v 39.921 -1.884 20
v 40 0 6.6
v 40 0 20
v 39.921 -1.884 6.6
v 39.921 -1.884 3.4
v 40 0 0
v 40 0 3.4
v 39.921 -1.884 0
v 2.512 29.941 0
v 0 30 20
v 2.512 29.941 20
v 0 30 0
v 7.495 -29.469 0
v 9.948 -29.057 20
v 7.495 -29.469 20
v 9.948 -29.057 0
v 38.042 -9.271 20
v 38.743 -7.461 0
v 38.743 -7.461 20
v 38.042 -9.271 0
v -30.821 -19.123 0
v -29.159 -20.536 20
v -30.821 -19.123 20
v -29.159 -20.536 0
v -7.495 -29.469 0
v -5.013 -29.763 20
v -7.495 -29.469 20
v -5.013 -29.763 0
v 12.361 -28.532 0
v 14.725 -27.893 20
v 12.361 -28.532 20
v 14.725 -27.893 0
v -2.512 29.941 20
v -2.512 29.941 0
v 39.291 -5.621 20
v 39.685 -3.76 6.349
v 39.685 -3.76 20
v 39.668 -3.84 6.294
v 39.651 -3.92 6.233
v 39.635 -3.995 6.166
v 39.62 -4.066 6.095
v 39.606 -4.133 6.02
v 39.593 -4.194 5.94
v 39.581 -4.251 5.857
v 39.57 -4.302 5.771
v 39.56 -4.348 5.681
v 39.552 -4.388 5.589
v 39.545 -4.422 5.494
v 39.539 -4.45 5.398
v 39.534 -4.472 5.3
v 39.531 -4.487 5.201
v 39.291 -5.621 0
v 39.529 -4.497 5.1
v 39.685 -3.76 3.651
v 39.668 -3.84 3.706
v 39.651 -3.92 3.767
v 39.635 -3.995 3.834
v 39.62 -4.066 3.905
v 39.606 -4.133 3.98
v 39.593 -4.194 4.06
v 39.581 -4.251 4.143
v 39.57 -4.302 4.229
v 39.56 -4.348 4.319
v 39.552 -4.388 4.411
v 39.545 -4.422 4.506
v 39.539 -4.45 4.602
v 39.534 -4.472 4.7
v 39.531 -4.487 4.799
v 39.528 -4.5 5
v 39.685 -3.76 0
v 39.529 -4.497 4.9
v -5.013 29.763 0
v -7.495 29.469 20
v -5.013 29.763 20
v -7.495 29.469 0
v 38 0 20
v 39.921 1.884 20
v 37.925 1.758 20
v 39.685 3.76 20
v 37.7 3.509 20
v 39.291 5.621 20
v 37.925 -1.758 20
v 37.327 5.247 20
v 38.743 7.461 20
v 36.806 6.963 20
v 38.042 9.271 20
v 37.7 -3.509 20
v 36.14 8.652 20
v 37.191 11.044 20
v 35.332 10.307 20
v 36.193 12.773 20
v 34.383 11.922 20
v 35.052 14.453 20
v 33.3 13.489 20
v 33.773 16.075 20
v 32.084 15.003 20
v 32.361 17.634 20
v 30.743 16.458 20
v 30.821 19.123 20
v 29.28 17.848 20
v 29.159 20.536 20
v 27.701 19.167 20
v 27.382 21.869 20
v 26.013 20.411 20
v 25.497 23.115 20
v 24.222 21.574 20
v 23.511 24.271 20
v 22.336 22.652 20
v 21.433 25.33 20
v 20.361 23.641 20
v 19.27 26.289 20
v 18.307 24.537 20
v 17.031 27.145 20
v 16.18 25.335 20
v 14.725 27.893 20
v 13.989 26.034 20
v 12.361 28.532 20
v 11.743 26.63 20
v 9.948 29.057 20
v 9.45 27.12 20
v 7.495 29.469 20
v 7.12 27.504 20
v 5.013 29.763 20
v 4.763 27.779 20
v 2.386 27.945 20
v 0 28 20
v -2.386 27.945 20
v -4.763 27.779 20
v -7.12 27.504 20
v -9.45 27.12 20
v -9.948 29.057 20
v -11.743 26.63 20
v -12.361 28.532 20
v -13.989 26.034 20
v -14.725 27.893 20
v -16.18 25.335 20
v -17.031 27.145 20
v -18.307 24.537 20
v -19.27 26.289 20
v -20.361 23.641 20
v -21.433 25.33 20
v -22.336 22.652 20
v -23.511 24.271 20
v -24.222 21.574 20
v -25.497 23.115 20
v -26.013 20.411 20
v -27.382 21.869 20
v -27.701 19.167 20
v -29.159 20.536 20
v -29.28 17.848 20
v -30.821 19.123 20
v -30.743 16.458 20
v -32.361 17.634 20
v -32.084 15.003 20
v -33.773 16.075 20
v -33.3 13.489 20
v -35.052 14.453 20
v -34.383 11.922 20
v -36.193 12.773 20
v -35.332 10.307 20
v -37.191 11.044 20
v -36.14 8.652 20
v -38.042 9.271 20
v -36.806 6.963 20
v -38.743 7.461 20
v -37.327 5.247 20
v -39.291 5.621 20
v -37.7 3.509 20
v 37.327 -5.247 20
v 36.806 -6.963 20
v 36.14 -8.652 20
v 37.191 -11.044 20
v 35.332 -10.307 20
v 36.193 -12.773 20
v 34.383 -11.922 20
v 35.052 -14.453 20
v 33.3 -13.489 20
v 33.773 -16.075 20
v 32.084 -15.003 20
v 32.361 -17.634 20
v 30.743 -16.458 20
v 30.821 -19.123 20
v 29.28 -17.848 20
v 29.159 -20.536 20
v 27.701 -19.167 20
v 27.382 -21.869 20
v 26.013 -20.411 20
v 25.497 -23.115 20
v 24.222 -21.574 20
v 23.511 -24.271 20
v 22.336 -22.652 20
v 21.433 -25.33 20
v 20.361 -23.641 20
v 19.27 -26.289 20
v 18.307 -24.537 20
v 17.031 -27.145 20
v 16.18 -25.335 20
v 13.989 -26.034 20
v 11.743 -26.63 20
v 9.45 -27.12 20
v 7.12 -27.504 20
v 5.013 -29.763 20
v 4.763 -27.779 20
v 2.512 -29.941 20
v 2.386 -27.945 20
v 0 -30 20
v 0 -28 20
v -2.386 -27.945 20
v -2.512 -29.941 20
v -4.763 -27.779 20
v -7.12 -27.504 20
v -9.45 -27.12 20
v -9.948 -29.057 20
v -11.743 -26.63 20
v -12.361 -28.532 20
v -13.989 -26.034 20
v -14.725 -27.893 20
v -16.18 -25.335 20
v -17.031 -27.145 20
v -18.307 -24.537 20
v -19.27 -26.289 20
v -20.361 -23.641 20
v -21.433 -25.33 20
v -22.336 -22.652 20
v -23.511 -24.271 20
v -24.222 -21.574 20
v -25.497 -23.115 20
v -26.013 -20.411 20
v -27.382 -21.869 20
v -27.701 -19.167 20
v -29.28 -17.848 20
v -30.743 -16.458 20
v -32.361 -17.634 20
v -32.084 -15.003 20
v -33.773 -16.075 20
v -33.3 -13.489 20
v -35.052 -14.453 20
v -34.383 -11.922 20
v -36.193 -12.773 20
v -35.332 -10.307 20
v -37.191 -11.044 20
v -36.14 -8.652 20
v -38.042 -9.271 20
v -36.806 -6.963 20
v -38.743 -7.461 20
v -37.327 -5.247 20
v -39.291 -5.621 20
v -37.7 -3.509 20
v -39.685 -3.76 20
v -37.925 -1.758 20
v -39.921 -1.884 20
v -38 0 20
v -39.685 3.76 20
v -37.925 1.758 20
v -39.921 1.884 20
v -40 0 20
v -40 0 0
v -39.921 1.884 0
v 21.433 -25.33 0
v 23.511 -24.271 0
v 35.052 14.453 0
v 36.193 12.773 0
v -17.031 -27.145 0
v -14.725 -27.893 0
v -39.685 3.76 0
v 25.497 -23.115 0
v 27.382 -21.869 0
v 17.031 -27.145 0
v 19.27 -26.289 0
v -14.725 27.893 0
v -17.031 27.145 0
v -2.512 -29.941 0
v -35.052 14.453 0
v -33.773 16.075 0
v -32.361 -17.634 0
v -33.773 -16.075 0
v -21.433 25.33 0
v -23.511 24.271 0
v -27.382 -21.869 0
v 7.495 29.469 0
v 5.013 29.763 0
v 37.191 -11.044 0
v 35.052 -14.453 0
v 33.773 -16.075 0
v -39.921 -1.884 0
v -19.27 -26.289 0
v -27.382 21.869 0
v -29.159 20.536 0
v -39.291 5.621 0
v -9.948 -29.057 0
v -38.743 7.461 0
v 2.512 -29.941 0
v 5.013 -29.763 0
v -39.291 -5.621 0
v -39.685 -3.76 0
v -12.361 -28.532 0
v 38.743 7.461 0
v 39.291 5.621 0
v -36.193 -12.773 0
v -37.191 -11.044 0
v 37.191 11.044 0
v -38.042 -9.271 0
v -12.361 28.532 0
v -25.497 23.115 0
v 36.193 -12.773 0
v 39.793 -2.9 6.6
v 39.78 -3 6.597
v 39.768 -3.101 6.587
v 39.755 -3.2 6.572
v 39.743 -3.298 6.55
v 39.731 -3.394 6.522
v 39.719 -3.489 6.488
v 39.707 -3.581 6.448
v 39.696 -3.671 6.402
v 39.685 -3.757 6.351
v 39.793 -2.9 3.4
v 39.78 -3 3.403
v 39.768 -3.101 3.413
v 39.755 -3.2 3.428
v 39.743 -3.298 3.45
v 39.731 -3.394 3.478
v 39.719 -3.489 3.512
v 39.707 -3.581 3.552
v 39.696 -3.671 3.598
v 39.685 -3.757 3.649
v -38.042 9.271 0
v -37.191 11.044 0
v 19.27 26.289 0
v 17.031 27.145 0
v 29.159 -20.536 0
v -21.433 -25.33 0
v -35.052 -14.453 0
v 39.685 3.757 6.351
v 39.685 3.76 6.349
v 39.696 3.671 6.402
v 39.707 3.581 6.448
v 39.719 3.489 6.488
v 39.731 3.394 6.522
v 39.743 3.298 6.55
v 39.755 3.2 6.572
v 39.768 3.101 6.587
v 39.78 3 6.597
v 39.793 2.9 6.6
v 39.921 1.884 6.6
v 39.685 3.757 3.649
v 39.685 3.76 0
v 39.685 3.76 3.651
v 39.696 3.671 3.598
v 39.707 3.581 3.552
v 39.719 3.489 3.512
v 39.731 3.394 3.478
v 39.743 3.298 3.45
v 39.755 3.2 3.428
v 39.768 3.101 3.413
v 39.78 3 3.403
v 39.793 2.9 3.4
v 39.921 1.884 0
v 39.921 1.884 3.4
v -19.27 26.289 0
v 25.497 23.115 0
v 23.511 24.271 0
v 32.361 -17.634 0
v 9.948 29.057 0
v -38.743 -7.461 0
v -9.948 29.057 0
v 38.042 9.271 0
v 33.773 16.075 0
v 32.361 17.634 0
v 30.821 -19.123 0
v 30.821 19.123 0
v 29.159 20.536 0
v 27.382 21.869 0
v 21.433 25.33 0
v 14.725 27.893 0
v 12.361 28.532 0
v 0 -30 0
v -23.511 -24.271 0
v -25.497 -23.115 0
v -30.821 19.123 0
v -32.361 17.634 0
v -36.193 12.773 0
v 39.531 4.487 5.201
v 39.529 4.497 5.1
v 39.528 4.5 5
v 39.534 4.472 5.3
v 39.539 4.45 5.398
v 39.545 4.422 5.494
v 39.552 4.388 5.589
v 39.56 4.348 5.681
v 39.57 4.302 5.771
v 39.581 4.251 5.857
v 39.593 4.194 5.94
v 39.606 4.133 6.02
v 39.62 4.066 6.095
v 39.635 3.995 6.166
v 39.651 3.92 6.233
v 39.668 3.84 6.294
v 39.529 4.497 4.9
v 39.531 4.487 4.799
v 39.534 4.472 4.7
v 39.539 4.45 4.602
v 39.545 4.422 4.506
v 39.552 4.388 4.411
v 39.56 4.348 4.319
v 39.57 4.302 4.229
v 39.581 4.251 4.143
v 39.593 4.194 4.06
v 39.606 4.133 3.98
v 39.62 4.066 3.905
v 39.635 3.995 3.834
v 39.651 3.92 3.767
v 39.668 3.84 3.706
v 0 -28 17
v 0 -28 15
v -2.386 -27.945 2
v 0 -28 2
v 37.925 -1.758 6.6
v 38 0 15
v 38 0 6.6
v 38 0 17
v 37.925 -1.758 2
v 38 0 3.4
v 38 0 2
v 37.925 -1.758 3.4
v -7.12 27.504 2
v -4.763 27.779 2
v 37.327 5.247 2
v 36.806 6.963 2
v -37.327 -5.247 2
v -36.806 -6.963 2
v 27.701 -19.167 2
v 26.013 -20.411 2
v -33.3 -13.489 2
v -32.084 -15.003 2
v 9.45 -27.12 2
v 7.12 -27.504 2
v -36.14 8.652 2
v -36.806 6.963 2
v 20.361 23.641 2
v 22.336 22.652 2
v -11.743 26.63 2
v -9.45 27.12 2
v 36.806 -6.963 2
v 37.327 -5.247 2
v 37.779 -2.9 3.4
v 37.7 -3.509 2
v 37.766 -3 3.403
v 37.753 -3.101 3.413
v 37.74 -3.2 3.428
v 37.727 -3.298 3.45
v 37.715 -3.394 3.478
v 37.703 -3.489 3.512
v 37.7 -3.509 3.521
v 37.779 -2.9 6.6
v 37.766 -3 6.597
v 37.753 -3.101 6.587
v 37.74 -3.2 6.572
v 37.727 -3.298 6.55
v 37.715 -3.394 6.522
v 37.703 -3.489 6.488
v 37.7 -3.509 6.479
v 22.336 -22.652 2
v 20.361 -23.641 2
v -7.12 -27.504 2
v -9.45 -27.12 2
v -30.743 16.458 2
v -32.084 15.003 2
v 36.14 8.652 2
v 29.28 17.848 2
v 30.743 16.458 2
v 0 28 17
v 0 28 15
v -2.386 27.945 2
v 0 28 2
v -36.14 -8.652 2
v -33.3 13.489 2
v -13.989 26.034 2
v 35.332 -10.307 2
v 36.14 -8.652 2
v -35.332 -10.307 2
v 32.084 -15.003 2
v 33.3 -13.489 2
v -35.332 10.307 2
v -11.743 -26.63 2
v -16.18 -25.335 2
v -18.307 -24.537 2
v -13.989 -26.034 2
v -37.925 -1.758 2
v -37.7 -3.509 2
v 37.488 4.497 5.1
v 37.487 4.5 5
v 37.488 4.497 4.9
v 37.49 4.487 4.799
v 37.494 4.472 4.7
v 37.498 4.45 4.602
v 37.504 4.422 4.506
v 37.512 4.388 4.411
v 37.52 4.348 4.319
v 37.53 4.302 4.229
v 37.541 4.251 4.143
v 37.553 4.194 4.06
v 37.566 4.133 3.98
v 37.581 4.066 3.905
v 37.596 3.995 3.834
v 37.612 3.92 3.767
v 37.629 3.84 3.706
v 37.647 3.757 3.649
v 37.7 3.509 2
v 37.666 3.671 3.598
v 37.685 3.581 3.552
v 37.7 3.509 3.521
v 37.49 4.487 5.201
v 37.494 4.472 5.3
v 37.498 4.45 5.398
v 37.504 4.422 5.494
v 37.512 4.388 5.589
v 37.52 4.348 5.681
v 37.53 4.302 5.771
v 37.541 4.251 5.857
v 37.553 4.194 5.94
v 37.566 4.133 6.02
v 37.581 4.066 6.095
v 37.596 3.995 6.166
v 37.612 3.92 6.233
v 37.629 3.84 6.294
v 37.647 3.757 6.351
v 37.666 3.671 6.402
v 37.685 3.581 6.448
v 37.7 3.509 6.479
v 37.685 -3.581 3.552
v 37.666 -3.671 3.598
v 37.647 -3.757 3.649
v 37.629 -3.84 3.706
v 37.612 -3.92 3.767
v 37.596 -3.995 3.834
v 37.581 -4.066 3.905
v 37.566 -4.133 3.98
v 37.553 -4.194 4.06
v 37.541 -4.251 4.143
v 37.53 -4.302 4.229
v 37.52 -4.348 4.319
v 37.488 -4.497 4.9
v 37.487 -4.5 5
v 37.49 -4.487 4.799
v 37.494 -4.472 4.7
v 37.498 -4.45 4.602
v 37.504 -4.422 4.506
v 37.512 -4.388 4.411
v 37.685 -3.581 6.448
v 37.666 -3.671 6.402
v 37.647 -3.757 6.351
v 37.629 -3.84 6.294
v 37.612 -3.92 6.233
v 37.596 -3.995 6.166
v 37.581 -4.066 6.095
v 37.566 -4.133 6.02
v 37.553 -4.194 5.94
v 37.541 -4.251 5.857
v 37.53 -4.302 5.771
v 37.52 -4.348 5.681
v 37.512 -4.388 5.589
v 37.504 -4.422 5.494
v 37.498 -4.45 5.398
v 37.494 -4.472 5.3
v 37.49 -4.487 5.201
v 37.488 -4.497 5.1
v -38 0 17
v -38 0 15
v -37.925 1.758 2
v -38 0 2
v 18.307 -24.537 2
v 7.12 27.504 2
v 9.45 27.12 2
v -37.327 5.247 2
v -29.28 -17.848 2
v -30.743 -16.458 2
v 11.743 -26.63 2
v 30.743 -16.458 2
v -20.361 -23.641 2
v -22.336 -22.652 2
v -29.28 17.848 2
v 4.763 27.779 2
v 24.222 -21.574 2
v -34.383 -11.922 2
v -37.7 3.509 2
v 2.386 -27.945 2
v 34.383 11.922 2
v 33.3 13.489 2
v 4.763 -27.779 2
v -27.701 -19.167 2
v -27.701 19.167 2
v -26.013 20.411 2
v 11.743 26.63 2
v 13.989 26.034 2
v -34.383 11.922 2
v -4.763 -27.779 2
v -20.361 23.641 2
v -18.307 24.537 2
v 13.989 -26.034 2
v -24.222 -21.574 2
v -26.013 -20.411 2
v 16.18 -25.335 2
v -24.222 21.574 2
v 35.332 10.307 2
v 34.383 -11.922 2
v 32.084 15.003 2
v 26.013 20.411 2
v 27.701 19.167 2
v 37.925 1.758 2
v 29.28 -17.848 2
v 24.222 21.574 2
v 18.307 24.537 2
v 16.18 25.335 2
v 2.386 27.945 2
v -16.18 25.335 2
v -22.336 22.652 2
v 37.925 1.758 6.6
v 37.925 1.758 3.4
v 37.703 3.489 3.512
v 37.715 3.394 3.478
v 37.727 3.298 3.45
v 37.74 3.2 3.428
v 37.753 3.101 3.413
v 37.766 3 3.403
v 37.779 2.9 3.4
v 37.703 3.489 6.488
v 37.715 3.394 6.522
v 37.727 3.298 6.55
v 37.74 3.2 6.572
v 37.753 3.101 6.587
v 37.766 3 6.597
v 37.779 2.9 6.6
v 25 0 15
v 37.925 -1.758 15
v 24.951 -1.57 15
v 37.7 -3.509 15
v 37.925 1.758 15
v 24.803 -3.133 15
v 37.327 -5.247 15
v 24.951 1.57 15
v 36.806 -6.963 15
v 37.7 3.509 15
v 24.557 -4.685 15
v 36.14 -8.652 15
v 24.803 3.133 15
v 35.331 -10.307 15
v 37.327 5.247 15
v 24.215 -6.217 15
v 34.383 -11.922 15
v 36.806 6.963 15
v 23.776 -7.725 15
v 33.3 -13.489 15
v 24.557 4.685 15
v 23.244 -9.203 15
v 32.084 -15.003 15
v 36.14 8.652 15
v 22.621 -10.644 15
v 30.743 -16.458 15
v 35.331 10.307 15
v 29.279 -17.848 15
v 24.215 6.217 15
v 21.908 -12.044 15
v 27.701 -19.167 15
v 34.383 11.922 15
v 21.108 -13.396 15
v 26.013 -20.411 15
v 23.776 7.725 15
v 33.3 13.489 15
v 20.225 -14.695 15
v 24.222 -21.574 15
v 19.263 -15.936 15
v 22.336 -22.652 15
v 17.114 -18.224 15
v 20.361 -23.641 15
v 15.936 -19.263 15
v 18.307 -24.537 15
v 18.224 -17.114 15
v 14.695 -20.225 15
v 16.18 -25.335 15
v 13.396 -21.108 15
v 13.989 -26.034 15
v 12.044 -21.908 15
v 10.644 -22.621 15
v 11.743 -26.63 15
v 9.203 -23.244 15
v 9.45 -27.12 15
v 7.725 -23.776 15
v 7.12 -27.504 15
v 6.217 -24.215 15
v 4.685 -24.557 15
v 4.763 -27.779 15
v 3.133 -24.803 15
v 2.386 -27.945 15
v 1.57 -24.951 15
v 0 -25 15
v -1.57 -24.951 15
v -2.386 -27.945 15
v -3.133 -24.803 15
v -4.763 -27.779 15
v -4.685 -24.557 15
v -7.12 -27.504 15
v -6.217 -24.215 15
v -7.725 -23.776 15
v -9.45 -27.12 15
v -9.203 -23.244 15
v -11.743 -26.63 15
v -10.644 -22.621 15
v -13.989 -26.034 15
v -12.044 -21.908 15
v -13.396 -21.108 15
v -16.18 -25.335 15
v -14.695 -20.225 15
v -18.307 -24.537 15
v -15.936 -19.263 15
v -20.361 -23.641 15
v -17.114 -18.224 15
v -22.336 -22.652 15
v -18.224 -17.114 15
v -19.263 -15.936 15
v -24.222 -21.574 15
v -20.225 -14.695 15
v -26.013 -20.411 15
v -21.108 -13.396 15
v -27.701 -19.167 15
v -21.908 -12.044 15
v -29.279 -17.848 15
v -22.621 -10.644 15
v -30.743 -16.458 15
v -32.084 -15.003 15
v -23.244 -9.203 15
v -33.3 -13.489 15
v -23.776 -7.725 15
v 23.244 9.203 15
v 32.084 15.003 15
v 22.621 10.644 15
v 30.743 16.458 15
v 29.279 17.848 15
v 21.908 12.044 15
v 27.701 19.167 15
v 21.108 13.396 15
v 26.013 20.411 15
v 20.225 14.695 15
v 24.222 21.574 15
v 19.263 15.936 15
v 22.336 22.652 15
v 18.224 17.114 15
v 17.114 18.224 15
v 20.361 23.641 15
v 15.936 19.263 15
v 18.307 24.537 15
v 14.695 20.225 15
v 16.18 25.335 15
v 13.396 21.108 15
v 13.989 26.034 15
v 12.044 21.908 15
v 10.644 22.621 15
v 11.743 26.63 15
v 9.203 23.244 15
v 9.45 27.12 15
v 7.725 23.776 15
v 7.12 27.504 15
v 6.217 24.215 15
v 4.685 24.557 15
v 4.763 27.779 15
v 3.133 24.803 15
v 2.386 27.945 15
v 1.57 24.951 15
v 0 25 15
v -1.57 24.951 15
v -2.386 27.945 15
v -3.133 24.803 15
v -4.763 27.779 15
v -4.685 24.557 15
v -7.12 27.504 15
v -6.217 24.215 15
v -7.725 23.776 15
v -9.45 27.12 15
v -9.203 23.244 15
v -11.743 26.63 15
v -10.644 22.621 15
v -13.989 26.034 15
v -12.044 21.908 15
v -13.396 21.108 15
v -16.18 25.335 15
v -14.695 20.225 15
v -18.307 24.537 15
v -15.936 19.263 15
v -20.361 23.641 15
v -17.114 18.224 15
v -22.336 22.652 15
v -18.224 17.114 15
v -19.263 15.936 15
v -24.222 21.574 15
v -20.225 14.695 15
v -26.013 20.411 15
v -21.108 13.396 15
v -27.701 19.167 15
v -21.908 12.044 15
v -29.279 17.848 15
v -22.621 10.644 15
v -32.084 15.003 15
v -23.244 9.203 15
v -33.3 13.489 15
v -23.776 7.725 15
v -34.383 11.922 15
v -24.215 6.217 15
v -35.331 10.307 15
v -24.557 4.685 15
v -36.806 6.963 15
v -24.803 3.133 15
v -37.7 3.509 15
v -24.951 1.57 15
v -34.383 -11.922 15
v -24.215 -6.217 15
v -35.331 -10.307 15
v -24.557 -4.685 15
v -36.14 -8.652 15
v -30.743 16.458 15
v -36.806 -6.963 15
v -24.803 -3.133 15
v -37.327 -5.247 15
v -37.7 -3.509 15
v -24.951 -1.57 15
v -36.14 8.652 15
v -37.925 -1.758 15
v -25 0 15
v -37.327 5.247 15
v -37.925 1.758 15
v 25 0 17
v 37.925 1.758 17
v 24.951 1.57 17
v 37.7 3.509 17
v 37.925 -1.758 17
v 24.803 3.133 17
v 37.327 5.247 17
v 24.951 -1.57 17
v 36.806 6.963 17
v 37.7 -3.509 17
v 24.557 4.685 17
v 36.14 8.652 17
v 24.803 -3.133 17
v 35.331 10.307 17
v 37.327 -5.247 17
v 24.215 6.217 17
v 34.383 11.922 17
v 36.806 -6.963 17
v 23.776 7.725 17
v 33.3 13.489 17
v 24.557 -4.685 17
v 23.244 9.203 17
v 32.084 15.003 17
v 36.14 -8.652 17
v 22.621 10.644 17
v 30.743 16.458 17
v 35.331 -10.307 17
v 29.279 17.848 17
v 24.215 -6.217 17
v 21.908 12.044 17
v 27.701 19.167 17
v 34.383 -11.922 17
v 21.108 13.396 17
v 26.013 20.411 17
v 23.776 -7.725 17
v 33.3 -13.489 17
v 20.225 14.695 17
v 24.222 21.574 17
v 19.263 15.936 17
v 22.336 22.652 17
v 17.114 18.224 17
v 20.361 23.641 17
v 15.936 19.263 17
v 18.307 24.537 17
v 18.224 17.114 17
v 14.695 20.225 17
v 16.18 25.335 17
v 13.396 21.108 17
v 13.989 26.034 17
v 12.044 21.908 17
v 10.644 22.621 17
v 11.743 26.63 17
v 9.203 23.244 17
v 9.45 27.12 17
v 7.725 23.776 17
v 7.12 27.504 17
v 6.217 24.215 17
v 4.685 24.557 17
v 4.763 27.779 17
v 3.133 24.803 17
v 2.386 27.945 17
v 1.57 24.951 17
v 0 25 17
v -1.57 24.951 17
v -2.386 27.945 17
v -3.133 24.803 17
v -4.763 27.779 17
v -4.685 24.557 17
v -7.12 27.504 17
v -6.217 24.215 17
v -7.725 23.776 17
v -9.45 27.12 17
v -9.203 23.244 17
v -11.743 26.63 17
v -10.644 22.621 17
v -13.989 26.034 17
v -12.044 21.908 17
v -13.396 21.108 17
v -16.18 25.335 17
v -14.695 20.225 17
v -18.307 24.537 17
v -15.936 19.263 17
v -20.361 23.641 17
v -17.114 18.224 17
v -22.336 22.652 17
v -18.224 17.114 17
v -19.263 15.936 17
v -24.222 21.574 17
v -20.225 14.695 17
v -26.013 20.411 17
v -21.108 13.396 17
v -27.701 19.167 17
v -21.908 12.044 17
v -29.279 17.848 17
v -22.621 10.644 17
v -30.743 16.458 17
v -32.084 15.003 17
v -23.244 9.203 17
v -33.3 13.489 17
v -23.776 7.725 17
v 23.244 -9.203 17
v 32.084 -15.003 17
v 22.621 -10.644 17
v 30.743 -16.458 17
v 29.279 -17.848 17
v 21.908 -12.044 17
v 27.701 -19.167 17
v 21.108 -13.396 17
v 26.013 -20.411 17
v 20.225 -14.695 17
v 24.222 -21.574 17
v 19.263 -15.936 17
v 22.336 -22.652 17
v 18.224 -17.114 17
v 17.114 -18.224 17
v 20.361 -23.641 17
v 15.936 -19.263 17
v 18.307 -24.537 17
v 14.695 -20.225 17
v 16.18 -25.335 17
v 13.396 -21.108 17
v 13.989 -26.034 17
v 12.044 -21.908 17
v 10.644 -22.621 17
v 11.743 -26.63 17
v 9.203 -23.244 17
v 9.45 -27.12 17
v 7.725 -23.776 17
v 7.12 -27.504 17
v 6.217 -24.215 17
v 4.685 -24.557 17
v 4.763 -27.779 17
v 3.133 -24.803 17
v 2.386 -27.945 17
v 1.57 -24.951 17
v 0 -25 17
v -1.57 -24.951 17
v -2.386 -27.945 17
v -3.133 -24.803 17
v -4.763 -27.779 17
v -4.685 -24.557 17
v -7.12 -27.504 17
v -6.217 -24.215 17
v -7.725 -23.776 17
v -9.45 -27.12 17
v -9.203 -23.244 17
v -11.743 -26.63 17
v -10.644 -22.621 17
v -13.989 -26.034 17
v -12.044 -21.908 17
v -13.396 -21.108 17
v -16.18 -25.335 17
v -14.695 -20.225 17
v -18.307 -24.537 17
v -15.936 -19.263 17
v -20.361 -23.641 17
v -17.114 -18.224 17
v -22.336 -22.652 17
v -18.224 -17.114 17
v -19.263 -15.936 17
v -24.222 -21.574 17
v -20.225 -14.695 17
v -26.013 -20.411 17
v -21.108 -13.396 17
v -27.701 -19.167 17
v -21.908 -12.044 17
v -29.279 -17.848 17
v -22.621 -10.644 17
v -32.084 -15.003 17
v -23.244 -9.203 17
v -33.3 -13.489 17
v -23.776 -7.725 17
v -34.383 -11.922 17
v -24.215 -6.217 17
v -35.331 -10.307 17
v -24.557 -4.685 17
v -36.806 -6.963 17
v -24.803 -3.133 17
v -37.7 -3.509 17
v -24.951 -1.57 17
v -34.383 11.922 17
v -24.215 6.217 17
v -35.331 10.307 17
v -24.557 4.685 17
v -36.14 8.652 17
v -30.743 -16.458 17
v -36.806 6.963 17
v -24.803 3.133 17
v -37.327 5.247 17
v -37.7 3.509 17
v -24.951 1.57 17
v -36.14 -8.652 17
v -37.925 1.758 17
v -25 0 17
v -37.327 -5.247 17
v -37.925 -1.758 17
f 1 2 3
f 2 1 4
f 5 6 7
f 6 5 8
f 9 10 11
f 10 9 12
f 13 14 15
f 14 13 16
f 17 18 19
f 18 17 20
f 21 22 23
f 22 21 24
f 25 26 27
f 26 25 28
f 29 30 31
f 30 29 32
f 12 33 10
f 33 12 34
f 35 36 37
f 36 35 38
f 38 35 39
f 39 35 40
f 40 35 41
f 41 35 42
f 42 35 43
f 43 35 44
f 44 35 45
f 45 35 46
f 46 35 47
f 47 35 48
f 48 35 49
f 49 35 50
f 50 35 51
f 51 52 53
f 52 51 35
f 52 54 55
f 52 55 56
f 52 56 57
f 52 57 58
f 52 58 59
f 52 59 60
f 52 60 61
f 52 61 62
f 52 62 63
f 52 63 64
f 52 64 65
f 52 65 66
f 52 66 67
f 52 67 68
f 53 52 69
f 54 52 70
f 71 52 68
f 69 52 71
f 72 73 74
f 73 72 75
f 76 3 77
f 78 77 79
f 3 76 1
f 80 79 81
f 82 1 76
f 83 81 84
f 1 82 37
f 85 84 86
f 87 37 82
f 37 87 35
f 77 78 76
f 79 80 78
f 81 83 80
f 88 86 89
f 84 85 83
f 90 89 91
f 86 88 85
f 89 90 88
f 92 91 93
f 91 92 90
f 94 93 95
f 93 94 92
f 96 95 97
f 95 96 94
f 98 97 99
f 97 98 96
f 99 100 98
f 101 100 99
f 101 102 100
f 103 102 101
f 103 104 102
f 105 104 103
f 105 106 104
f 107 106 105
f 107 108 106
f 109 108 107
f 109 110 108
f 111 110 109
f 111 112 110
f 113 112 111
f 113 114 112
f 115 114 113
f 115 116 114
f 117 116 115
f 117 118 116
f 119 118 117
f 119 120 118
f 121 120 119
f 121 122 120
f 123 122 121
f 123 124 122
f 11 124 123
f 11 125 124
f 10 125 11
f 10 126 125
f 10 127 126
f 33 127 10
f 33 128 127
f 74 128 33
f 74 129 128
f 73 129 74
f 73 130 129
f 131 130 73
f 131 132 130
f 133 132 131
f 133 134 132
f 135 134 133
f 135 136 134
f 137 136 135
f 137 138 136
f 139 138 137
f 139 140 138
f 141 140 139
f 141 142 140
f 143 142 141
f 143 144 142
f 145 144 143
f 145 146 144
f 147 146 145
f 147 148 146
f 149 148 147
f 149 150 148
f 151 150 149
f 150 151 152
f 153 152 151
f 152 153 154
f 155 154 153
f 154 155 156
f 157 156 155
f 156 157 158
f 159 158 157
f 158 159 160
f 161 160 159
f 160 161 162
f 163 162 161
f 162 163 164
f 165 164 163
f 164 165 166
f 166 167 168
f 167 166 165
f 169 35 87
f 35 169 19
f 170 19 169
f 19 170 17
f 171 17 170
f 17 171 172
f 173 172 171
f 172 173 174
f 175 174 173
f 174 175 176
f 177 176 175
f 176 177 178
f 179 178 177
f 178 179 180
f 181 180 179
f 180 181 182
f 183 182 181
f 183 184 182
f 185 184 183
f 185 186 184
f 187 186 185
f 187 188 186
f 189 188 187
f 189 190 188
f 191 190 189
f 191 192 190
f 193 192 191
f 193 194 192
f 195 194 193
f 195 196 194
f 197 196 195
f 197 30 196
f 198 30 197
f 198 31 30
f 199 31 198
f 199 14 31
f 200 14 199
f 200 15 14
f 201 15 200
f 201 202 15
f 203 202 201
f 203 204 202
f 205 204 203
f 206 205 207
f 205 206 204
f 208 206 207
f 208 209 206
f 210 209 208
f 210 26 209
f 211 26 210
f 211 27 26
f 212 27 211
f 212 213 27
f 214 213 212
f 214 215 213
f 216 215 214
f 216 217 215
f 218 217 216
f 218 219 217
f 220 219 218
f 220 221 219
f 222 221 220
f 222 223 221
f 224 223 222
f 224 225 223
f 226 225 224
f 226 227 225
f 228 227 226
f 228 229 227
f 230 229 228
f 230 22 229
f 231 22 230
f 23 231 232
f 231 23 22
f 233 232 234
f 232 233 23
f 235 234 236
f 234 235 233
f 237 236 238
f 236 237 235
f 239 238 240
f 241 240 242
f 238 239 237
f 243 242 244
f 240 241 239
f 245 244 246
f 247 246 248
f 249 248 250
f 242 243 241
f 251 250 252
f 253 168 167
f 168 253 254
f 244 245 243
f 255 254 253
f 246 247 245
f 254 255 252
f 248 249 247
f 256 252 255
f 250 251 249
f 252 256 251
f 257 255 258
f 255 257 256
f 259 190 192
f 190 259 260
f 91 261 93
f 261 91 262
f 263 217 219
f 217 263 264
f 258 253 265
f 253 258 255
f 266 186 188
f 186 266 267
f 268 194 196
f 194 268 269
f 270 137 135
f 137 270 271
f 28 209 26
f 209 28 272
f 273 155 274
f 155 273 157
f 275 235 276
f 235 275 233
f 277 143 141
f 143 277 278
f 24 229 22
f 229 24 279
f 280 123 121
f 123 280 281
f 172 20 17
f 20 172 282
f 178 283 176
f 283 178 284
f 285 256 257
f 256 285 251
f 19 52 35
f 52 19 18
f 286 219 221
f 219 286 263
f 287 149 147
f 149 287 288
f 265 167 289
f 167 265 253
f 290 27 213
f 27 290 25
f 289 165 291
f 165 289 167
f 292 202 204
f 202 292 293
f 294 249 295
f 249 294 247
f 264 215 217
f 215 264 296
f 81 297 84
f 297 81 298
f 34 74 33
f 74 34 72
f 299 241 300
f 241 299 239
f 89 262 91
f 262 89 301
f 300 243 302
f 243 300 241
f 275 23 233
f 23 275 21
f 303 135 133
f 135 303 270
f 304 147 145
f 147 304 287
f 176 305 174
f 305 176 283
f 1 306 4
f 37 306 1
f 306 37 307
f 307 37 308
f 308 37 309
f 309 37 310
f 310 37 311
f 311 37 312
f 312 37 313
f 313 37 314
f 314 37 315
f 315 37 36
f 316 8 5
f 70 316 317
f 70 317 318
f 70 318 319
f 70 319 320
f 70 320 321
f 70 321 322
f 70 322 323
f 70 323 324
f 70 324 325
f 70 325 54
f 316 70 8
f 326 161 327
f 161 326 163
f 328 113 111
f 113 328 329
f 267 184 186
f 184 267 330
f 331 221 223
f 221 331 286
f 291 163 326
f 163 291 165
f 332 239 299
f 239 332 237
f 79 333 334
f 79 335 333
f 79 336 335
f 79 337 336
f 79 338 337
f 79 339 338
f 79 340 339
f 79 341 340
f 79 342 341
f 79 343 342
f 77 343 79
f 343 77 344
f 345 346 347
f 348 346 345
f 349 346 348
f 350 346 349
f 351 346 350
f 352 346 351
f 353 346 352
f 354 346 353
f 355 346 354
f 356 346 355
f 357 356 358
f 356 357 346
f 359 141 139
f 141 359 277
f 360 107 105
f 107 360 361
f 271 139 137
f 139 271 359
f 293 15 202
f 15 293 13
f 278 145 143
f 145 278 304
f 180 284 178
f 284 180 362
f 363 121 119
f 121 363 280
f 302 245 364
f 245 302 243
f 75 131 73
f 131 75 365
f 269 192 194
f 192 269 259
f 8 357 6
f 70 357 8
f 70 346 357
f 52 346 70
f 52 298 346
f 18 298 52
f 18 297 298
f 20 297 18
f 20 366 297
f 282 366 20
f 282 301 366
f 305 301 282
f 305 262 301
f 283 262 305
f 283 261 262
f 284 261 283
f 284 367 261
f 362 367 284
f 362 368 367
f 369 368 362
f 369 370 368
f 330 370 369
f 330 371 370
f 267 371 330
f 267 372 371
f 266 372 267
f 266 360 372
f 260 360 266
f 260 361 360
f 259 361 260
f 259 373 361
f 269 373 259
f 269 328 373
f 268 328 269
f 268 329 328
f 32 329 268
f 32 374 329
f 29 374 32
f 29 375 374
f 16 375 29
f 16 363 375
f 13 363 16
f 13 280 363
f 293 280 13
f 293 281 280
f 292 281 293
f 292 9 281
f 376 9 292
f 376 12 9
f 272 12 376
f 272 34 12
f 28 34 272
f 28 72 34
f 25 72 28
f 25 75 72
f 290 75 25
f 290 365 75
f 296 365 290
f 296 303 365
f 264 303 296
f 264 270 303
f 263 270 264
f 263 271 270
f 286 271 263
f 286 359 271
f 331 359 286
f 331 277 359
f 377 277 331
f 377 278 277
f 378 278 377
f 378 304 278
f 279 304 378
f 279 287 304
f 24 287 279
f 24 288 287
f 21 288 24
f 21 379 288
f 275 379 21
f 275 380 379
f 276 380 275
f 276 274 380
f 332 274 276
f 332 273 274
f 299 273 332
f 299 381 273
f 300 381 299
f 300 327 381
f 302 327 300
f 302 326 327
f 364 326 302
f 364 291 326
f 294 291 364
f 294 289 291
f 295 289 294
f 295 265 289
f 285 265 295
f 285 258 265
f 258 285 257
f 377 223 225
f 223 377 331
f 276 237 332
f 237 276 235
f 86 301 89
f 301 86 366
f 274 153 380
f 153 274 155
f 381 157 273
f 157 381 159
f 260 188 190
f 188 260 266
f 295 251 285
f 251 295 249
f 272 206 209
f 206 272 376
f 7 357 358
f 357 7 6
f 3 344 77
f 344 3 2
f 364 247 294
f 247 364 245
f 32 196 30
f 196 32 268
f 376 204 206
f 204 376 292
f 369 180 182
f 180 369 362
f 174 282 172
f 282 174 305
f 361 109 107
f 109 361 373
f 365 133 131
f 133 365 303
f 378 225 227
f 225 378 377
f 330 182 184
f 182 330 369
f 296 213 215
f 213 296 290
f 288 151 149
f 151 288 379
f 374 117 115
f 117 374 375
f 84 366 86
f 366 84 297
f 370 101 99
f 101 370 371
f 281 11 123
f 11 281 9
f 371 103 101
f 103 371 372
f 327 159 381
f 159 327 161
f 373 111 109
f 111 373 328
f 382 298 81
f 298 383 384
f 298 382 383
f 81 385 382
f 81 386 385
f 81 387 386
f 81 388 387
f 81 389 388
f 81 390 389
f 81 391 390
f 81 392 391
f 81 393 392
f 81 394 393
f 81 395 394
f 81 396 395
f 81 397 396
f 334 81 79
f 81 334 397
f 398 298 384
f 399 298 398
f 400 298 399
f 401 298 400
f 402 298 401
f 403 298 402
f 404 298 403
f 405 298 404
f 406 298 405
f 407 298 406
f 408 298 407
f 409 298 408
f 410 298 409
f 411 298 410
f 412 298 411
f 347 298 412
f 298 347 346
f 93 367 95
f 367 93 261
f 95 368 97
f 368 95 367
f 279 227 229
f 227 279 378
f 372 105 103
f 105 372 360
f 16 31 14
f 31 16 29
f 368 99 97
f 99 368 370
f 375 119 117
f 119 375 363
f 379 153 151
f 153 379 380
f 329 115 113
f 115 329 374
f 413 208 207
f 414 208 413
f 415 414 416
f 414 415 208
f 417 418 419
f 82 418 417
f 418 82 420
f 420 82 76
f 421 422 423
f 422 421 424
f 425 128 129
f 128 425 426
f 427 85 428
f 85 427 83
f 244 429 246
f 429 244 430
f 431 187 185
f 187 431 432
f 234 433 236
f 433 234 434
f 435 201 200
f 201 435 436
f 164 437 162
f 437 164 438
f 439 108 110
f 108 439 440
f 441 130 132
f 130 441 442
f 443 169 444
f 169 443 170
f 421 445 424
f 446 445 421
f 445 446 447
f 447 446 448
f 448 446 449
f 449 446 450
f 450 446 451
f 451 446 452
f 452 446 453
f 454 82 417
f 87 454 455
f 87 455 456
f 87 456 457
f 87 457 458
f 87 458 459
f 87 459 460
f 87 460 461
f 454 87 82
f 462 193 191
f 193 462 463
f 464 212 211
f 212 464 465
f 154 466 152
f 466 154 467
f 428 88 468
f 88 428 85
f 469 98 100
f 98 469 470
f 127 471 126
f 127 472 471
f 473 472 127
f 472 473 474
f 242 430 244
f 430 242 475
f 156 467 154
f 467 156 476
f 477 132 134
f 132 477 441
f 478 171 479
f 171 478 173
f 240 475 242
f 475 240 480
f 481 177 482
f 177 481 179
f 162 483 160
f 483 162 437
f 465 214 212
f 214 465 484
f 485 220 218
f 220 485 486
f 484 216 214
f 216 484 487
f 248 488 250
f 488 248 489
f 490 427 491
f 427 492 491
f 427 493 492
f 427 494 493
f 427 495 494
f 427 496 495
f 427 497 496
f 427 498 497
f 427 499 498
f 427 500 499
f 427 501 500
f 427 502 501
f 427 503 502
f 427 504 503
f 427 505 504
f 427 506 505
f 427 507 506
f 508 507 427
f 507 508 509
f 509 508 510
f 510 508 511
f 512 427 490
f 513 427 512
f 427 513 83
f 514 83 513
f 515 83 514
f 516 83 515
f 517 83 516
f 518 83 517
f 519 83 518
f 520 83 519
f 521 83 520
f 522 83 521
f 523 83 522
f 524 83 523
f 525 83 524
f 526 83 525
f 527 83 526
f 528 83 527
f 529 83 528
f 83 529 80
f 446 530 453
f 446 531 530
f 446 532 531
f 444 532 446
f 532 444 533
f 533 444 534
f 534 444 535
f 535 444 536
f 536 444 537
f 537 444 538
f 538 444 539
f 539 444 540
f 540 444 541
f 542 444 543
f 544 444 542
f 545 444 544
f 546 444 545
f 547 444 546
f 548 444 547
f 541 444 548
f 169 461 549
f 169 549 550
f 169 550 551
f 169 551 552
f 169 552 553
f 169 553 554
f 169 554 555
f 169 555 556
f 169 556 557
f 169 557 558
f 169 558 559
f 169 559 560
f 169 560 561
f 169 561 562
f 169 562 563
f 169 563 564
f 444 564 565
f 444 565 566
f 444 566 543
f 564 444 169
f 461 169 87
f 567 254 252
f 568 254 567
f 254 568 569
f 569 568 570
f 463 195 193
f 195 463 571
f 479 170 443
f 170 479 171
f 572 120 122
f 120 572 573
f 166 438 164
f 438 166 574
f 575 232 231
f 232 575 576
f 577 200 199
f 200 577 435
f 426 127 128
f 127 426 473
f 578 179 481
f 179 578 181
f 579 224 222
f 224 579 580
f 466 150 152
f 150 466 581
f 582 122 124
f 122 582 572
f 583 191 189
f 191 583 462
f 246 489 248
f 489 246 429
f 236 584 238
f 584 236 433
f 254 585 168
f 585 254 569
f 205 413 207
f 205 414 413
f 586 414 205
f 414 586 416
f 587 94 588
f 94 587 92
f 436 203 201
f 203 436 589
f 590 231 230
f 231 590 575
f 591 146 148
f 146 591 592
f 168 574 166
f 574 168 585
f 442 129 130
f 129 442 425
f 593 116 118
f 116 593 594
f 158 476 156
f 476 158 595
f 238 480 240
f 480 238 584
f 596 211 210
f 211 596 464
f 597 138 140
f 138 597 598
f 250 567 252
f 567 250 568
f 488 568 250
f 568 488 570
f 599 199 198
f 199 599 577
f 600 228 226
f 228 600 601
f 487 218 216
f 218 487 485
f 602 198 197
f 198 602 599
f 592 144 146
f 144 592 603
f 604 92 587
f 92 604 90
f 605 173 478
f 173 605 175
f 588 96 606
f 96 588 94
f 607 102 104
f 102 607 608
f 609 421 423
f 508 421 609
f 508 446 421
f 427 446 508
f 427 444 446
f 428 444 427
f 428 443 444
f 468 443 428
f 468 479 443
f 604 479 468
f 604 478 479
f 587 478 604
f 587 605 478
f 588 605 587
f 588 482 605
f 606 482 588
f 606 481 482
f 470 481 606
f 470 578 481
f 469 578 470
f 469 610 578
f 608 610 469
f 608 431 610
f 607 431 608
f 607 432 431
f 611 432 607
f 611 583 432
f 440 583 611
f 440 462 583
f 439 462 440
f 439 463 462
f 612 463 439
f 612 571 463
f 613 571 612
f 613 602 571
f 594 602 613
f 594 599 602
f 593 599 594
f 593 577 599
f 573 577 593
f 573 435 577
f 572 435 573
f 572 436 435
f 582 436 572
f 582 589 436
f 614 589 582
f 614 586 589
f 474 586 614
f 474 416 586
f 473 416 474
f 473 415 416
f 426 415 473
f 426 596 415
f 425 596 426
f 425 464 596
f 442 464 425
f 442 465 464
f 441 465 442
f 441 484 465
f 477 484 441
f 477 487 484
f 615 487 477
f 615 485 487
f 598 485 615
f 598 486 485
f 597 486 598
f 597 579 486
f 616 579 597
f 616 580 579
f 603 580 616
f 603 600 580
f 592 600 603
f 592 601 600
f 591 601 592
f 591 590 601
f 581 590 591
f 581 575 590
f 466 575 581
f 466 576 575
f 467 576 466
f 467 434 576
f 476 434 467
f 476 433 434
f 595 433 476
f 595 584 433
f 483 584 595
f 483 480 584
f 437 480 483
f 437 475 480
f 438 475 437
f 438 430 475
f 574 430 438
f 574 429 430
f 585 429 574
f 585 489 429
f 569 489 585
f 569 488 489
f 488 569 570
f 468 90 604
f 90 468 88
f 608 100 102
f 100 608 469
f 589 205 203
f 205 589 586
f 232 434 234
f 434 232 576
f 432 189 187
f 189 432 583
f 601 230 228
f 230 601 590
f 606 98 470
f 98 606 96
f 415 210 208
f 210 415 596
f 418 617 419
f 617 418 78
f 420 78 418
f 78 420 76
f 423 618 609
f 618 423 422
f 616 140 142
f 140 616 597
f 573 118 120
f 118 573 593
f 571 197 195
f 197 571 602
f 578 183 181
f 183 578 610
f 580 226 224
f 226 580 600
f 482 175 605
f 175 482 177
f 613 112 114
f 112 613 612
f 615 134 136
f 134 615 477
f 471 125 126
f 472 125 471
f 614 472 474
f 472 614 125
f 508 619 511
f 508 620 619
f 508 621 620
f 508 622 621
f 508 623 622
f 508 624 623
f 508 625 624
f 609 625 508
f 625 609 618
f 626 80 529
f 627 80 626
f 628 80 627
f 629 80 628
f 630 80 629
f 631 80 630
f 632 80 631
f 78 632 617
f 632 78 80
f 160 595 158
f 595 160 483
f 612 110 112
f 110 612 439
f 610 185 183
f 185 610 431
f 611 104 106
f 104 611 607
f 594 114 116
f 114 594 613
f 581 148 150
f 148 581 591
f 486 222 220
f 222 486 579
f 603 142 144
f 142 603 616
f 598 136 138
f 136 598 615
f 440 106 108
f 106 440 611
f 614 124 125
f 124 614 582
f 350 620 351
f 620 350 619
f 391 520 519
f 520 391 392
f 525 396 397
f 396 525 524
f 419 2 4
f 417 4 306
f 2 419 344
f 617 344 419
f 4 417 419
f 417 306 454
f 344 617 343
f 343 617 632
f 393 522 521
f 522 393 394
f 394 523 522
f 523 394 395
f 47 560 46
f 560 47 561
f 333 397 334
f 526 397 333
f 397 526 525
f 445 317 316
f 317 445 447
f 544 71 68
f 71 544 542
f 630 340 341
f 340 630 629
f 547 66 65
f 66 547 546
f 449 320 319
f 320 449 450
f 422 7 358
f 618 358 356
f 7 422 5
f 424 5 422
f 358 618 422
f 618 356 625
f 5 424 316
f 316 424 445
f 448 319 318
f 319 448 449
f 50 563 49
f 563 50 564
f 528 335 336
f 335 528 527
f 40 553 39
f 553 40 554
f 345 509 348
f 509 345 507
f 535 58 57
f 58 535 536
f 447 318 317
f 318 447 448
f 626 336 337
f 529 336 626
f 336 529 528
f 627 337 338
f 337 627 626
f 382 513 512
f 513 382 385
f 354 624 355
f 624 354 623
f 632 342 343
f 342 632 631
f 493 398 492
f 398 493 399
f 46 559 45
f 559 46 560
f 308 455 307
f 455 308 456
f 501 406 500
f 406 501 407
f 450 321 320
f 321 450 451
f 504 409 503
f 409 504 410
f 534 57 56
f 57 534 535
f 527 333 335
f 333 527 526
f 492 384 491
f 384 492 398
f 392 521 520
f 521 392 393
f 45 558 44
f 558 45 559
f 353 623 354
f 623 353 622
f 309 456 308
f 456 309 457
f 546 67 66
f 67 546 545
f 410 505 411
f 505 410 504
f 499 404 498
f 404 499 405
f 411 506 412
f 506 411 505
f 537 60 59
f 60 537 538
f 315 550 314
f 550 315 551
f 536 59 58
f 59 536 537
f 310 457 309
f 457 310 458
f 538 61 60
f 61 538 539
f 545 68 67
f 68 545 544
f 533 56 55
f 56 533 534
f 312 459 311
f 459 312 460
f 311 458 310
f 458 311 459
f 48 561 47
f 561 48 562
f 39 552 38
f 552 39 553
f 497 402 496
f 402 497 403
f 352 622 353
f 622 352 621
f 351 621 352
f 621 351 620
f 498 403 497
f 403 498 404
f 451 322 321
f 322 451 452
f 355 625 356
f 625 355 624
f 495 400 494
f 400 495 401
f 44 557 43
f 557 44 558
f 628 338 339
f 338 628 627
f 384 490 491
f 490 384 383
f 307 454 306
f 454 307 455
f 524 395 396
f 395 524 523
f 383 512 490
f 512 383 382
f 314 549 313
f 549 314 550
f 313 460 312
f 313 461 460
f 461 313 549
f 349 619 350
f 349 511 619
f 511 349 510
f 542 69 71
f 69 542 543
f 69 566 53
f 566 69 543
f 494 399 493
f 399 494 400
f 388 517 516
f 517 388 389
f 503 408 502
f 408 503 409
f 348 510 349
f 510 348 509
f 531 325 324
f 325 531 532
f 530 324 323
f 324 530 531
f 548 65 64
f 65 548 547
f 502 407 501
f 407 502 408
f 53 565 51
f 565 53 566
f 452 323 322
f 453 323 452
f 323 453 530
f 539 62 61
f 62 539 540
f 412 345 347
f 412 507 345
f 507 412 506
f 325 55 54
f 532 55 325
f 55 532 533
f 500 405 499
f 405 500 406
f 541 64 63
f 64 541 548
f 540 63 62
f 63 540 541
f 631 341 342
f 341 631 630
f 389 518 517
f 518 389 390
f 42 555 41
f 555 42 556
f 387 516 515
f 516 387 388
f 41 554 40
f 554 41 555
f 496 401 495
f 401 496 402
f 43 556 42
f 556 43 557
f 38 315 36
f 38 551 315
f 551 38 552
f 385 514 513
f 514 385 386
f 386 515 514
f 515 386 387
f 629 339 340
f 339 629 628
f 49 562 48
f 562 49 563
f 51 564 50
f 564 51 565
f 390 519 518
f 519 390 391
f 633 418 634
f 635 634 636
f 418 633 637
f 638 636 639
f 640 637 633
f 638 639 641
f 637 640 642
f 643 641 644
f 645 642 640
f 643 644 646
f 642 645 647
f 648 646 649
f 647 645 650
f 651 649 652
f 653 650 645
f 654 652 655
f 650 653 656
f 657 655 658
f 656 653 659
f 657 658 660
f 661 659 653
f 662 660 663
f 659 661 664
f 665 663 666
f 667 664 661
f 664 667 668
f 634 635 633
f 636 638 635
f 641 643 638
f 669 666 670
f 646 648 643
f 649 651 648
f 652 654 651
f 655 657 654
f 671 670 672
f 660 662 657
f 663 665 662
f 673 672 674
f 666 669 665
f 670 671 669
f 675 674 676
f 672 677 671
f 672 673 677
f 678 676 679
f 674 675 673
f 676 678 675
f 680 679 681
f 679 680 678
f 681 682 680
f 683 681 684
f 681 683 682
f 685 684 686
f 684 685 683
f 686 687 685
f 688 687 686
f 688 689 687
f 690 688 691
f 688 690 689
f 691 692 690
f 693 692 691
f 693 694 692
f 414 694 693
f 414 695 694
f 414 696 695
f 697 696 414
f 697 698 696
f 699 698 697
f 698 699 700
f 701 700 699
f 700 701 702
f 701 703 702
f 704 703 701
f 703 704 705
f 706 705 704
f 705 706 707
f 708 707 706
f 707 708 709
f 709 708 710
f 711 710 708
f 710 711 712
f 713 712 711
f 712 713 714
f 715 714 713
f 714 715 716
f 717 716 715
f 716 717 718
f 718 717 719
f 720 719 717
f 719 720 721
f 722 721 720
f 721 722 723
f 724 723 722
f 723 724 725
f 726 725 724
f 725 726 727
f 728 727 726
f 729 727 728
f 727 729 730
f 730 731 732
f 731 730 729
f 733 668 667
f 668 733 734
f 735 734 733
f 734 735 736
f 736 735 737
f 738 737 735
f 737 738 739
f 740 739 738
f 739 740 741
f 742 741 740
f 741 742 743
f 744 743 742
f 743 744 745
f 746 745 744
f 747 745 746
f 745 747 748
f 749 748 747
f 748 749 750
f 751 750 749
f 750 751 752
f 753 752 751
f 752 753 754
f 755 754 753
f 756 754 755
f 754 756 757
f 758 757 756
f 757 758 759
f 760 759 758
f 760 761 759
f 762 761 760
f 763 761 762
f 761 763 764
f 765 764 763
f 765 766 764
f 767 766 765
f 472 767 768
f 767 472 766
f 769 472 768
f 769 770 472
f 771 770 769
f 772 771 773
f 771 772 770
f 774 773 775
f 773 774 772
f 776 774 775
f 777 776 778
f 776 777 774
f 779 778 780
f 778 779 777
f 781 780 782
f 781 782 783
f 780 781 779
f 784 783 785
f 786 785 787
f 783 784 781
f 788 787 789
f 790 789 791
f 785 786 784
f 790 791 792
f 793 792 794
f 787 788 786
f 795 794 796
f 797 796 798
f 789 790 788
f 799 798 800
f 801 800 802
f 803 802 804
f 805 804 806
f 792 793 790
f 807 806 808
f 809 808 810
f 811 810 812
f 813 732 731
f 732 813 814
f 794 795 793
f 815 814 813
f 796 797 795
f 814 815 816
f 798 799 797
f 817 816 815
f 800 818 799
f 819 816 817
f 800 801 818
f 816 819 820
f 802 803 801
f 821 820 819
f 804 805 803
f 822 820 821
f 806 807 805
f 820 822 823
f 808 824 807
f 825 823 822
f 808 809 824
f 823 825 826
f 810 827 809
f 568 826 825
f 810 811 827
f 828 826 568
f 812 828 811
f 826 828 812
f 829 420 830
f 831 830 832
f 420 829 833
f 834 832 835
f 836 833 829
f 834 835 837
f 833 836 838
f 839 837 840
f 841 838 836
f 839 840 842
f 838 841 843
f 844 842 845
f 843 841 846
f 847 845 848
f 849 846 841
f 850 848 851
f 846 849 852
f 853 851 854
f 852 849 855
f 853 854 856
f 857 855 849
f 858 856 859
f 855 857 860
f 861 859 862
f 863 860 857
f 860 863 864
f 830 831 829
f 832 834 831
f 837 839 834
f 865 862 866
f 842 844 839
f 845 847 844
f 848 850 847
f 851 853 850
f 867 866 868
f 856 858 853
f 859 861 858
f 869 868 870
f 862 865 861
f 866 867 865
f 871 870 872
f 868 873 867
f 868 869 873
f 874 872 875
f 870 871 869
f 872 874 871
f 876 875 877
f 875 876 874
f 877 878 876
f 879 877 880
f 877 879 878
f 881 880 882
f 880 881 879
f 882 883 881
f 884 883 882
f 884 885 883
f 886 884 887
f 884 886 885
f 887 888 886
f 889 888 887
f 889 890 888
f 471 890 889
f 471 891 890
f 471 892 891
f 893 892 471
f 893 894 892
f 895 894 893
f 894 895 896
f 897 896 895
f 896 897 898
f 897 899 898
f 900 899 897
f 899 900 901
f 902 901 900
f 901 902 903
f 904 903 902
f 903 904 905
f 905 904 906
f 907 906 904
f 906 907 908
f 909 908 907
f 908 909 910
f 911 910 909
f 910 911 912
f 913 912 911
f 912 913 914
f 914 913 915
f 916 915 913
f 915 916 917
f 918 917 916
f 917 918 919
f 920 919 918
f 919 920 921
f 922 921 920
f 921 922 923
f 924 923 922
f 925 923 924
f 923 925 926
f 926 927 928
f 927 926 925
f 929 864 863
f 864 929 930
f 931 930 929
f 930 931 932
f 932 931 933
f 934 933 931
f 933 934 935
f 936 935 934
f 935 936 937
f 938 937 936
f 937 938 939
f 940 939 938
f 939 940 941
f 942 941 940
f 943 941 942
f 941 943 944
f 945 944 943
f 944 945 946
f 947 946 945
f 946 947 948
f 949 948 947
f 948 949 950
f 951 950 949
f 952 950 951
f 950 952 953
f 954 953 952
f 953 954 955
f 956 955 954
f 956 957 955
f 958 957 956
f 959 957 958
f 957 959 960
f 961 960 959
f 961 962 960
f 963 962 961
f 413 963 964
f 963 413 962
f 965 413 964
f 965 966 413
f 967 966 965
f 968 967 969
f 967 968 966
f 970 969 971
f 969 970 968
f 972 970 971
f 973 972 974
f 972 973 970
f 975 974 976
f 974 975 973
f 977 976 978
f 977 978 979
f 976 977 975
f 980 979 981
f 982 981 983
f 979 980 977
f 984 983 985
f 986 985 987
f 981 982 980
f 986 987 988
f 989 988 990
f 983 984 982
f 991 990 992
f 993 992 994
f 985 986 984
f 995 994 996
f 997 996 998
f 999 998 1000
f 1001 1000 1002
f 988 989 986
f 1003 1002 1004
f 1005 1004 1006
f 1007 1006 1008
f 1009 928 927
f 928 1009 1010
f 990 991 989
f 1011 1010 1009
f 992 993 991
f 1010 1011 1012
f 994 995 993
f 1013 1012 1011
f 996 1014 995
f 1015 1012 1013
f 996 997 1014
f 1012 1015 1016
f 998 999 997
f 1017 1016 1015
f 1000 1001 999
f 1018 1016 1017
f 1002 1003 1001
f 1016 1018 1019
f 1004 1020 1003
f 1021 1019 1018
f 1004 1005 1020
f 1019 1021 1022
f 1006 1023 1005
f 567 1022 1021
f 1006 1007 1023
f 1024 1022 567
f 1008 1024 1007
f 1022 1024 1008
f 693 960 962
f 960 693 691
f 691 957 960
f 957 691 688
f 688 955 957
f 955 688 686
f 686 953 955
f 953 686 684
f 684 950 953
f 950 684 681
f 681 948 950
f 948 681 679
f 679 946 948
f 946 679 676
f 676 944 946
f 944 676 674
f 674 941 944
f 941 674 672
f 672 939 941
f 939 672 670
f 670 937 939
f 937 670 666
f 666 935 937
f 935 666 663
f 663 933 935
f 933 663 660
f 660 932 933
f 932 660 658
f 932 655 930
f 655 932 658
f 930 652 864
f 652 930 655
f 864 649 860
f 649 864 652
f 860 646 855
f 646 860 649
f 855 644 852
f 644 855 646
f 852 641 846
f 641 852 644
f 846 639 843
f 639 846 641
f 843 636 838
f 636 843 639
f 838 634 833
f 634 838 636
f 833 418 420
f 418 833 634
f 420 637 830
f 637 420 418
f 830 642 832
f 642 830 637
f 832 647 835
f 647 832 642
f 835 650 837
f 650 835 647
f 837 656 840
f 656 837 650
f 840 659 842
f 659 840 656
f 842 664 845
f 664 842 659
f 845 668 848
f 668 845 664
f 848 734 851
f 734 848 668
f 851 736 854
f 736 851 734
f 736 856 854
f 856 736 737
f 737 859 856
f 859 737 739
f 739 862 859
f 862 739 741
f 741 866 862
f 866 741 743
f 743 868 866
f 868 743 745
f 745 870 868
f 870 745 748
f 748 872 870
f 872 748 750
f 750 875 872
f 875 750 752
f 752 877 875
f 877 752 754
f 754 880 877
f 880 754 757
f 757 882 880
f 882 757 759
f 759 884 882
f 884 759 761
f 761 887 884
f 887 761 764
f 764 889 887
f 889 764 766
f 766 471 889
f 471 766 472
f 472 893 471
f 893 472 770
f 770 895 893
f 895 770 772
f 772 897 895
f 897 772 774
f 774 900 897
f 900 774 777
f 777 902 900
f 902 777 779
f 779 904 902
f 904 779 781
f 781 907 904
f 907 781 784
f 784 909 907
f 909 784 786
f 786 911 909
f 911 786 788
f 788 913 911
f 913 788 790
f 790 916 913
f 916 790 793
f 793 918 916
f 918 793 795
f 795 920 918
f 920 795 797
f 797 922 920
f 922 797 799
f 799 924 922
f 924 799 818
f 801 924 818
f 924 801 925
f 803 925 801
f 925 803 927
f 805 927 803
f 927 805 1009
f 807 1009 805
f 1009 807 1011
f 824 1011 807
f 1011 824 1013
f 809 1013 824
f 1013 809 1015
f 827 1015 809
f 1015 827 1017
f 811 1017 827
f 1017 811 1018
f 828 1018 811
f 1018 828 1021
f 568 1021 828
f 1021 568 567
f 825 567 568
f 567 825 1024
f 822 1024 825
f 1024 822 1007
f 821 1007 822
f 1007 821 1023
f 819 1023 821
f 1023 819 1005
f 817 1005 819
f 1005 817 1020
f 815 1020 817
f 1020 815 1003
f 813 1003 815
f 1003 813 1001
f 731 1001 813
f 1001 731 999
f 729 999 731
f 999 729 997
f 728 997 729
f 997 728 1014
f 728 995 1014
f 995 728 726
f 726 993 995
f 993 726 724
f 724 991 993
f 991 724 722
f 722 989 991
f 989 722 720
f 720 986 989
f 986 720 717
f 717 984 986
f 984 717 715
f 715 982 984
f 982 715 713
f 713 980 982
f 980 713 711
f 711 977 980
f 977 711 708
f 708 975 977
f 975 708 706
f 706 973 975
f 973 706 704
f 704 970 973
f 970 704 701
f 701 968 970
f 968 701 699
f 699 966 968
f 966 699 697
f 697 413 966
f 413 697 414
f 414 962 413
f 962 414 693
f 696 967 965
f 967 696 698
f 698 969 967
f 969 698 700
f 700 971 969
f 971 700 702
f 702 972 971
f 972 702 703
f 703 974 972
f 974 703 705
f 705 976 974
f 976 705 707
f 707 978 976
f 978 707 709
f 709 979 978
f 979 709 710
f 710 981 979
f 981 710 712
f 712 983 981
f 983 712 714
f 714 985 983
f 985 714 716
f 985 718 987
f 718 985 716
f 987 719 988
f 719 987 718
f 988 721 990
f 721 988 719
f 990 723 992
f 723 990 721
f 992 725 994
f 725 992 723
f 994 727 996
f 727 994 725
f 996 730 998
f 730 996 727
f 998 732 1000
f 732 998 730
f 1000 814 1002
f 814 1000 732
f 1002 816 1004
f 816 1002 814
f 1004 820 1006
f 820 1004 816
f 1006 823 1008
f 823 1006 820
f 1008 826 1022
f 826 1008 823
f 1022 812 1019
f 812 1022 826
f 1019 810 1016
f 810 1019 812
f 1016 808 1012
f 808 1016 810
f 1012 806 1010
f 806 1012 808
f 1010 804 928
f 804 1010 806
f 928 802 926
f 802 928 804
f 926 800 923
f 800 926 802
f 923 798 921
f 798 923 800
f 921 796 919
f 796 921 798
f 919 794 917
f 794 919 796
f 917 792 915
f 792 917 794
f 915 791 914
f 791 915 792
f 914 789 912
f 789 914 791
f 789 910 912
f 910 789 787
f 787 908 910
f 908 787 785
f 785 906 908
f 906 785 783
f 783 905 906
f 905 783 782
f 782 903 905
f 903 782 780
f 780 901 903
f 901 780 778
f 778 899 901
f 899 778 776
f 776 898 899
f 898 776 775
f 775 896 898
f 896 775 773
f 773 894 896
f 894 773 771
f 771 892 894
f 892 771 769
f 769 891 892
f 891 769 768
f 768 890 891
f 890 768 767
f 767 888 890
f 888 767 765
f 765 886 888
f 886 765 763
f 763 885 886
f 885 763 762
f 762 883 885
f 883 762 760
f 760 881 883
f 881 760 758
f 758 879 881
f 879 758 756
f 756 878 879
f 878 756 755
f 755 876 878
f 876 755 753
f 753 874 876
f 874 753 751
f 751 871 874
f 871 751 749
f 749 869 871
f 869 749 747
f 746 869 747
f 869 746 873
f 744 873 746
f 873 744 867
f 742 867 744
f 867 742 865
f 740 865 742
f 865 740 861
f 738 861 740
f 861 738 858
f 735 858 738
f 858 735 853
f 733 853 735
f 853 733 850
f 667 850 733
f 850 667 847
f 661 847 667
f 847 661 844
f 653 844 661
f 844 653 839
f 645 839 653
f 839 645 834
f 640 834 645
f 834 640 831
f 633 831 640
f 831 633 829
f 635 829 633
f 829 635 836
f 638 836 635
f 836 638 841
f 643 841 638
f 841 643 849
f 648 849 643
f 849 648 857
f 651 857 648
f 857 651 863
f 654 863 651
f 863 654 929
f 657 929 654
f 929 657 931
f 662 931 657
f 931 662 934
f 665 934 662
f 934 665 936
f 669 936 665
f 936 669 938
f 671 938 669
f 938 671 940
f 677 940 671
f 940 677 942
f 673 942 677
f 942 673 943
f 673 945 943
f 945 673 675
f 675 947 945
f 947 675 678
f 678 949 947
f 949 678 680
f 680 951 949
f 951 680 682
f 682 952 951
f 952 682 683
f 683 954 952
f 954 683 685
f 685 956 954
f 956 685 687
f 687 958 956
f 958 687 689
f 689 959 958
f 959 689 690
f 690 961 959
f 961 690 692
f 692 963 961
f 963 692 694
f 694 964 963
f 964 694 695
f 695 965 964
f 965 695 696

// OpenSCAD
// Customizable Elliptical Case with USB-C Port
// All dimensions in millimeters

/* [Case Dimensions] */
// Length of the case (X-axis)
case_length = 80;
// Width of the case (Y-axis)
case_width = 60;
// Height of the case (Z-axis)
case_height = 20;
// Wall thickness
wall_thickness = 2;

/* [USB-C Port] */
// USB-C port width
usbc_width = 9;
// USB-C port height
usbc_height = 3.2;
// USB-C port depth (how far it goes into the case)
usbc_depth = 8;
// USB-C port position from bottom (Z position)
usbc_z_position = 5;
// USB-C port angle around the case (0-360 degrees)
usbc_angle = 0;

/* [Opening] */
// Height of the top opening (from top)
opening_height = 5;
// Opening width (X-axis, 0 = full width)
opening_width = 0;
// Opening depth (Y-axis, 0 = full depth)
opening_depth = 0;
// Opening corner radius
opening_radius = 2;

/* [Inner Mount Structure] */
enable_inner_circle = true;
inner_circle_position = 5;
inner_circle_height = 2;
inner_circle_diameter = 50;
inner_ring_thickness = 2;

/* [Advanced] */
// Smoothness (higher = smoother, but slower)
$fn = 100;

module usbc_port() {
    // USB-C connector shape with rounded corners
    hull() {
        r = usbc_height / 2;
        translate([0, -(usbc_width/2 - r), -(usbc_height/2 - r)])
            rotate([0, 90, 0])
                cylinder(h=usbc_depth, r=r);
        translate([0, (usbc_width/2 - r), -(usbc_height/2 - r)])
            rotate([0, 90, 0])
                cylinder(h=usbc_depth, r=r);
        translate([0, -(usbc_width/2 - r), (usbc_height/2 - r)])
            rotate([0, 90, 0])
                cylinder(h=usbc_depth, r=r);
        translate([0, (usbc_width/2 - r), (usbc_height/2 - r)])
            rotate([0, 90, 0])
                cylinder(h=usbc_depth, r=r);
    }
}

module rounded_box(x, y, z, r) {
    hull() {
        translate([-(x/2 - r), -(y/2 - r), 0])
            cylinder(h=z, r=r);
        translate([(x/2 - r), -(y/2 - r), 0])
            cylinder(h=z, r=r);
        translate([-(x/2 - r), (y/2 - r), 0])
            cylinder(h=z, r=r);
        translate([(x/2 - r), (y/2 - r), 0])
            cylinder(h=z, r=r);
    }
}

module elliptical_case() {
    difference() {
        // Outer shell - extruded ellipse
        linear_extrude(height=case_height)
            scale([case_length/2, case_width/2])
                circle(r=1);
        
        // Inner cavity - extruded smaller ellipse (open top)
        translate([0, 0, wall_thickness])
            linear_extrude(height=case_height)
                scale([(case_length/2 - wall_thickness), (case_width/2 - wall_thickness)])
                    circle(r=1);
        
        // USB-C port cutout (horizontal)
        rotate([0, 0, usbc_angle])
        translate([case_length/2 - usbc_depth + 0.1, 0, usbc_z_position])
        usbc_port();
    }
    
    // Inner circle mount ring (for gluing plate inside) - added AFTER the difference
    if (enable_inner_circle) {
        translate([0, 0, case_height - inner_circle_position])
            linear_extrude(height=inner_circle_height)
                difference() {
                    scale([(case_length/2 - wall_thickness), (case_width/2 - wall_thickness)])
                        circle(r=1);
                    circle(d=inner_circle_diameter);
                }
    }
}

// Render the case
elliptical_case();
